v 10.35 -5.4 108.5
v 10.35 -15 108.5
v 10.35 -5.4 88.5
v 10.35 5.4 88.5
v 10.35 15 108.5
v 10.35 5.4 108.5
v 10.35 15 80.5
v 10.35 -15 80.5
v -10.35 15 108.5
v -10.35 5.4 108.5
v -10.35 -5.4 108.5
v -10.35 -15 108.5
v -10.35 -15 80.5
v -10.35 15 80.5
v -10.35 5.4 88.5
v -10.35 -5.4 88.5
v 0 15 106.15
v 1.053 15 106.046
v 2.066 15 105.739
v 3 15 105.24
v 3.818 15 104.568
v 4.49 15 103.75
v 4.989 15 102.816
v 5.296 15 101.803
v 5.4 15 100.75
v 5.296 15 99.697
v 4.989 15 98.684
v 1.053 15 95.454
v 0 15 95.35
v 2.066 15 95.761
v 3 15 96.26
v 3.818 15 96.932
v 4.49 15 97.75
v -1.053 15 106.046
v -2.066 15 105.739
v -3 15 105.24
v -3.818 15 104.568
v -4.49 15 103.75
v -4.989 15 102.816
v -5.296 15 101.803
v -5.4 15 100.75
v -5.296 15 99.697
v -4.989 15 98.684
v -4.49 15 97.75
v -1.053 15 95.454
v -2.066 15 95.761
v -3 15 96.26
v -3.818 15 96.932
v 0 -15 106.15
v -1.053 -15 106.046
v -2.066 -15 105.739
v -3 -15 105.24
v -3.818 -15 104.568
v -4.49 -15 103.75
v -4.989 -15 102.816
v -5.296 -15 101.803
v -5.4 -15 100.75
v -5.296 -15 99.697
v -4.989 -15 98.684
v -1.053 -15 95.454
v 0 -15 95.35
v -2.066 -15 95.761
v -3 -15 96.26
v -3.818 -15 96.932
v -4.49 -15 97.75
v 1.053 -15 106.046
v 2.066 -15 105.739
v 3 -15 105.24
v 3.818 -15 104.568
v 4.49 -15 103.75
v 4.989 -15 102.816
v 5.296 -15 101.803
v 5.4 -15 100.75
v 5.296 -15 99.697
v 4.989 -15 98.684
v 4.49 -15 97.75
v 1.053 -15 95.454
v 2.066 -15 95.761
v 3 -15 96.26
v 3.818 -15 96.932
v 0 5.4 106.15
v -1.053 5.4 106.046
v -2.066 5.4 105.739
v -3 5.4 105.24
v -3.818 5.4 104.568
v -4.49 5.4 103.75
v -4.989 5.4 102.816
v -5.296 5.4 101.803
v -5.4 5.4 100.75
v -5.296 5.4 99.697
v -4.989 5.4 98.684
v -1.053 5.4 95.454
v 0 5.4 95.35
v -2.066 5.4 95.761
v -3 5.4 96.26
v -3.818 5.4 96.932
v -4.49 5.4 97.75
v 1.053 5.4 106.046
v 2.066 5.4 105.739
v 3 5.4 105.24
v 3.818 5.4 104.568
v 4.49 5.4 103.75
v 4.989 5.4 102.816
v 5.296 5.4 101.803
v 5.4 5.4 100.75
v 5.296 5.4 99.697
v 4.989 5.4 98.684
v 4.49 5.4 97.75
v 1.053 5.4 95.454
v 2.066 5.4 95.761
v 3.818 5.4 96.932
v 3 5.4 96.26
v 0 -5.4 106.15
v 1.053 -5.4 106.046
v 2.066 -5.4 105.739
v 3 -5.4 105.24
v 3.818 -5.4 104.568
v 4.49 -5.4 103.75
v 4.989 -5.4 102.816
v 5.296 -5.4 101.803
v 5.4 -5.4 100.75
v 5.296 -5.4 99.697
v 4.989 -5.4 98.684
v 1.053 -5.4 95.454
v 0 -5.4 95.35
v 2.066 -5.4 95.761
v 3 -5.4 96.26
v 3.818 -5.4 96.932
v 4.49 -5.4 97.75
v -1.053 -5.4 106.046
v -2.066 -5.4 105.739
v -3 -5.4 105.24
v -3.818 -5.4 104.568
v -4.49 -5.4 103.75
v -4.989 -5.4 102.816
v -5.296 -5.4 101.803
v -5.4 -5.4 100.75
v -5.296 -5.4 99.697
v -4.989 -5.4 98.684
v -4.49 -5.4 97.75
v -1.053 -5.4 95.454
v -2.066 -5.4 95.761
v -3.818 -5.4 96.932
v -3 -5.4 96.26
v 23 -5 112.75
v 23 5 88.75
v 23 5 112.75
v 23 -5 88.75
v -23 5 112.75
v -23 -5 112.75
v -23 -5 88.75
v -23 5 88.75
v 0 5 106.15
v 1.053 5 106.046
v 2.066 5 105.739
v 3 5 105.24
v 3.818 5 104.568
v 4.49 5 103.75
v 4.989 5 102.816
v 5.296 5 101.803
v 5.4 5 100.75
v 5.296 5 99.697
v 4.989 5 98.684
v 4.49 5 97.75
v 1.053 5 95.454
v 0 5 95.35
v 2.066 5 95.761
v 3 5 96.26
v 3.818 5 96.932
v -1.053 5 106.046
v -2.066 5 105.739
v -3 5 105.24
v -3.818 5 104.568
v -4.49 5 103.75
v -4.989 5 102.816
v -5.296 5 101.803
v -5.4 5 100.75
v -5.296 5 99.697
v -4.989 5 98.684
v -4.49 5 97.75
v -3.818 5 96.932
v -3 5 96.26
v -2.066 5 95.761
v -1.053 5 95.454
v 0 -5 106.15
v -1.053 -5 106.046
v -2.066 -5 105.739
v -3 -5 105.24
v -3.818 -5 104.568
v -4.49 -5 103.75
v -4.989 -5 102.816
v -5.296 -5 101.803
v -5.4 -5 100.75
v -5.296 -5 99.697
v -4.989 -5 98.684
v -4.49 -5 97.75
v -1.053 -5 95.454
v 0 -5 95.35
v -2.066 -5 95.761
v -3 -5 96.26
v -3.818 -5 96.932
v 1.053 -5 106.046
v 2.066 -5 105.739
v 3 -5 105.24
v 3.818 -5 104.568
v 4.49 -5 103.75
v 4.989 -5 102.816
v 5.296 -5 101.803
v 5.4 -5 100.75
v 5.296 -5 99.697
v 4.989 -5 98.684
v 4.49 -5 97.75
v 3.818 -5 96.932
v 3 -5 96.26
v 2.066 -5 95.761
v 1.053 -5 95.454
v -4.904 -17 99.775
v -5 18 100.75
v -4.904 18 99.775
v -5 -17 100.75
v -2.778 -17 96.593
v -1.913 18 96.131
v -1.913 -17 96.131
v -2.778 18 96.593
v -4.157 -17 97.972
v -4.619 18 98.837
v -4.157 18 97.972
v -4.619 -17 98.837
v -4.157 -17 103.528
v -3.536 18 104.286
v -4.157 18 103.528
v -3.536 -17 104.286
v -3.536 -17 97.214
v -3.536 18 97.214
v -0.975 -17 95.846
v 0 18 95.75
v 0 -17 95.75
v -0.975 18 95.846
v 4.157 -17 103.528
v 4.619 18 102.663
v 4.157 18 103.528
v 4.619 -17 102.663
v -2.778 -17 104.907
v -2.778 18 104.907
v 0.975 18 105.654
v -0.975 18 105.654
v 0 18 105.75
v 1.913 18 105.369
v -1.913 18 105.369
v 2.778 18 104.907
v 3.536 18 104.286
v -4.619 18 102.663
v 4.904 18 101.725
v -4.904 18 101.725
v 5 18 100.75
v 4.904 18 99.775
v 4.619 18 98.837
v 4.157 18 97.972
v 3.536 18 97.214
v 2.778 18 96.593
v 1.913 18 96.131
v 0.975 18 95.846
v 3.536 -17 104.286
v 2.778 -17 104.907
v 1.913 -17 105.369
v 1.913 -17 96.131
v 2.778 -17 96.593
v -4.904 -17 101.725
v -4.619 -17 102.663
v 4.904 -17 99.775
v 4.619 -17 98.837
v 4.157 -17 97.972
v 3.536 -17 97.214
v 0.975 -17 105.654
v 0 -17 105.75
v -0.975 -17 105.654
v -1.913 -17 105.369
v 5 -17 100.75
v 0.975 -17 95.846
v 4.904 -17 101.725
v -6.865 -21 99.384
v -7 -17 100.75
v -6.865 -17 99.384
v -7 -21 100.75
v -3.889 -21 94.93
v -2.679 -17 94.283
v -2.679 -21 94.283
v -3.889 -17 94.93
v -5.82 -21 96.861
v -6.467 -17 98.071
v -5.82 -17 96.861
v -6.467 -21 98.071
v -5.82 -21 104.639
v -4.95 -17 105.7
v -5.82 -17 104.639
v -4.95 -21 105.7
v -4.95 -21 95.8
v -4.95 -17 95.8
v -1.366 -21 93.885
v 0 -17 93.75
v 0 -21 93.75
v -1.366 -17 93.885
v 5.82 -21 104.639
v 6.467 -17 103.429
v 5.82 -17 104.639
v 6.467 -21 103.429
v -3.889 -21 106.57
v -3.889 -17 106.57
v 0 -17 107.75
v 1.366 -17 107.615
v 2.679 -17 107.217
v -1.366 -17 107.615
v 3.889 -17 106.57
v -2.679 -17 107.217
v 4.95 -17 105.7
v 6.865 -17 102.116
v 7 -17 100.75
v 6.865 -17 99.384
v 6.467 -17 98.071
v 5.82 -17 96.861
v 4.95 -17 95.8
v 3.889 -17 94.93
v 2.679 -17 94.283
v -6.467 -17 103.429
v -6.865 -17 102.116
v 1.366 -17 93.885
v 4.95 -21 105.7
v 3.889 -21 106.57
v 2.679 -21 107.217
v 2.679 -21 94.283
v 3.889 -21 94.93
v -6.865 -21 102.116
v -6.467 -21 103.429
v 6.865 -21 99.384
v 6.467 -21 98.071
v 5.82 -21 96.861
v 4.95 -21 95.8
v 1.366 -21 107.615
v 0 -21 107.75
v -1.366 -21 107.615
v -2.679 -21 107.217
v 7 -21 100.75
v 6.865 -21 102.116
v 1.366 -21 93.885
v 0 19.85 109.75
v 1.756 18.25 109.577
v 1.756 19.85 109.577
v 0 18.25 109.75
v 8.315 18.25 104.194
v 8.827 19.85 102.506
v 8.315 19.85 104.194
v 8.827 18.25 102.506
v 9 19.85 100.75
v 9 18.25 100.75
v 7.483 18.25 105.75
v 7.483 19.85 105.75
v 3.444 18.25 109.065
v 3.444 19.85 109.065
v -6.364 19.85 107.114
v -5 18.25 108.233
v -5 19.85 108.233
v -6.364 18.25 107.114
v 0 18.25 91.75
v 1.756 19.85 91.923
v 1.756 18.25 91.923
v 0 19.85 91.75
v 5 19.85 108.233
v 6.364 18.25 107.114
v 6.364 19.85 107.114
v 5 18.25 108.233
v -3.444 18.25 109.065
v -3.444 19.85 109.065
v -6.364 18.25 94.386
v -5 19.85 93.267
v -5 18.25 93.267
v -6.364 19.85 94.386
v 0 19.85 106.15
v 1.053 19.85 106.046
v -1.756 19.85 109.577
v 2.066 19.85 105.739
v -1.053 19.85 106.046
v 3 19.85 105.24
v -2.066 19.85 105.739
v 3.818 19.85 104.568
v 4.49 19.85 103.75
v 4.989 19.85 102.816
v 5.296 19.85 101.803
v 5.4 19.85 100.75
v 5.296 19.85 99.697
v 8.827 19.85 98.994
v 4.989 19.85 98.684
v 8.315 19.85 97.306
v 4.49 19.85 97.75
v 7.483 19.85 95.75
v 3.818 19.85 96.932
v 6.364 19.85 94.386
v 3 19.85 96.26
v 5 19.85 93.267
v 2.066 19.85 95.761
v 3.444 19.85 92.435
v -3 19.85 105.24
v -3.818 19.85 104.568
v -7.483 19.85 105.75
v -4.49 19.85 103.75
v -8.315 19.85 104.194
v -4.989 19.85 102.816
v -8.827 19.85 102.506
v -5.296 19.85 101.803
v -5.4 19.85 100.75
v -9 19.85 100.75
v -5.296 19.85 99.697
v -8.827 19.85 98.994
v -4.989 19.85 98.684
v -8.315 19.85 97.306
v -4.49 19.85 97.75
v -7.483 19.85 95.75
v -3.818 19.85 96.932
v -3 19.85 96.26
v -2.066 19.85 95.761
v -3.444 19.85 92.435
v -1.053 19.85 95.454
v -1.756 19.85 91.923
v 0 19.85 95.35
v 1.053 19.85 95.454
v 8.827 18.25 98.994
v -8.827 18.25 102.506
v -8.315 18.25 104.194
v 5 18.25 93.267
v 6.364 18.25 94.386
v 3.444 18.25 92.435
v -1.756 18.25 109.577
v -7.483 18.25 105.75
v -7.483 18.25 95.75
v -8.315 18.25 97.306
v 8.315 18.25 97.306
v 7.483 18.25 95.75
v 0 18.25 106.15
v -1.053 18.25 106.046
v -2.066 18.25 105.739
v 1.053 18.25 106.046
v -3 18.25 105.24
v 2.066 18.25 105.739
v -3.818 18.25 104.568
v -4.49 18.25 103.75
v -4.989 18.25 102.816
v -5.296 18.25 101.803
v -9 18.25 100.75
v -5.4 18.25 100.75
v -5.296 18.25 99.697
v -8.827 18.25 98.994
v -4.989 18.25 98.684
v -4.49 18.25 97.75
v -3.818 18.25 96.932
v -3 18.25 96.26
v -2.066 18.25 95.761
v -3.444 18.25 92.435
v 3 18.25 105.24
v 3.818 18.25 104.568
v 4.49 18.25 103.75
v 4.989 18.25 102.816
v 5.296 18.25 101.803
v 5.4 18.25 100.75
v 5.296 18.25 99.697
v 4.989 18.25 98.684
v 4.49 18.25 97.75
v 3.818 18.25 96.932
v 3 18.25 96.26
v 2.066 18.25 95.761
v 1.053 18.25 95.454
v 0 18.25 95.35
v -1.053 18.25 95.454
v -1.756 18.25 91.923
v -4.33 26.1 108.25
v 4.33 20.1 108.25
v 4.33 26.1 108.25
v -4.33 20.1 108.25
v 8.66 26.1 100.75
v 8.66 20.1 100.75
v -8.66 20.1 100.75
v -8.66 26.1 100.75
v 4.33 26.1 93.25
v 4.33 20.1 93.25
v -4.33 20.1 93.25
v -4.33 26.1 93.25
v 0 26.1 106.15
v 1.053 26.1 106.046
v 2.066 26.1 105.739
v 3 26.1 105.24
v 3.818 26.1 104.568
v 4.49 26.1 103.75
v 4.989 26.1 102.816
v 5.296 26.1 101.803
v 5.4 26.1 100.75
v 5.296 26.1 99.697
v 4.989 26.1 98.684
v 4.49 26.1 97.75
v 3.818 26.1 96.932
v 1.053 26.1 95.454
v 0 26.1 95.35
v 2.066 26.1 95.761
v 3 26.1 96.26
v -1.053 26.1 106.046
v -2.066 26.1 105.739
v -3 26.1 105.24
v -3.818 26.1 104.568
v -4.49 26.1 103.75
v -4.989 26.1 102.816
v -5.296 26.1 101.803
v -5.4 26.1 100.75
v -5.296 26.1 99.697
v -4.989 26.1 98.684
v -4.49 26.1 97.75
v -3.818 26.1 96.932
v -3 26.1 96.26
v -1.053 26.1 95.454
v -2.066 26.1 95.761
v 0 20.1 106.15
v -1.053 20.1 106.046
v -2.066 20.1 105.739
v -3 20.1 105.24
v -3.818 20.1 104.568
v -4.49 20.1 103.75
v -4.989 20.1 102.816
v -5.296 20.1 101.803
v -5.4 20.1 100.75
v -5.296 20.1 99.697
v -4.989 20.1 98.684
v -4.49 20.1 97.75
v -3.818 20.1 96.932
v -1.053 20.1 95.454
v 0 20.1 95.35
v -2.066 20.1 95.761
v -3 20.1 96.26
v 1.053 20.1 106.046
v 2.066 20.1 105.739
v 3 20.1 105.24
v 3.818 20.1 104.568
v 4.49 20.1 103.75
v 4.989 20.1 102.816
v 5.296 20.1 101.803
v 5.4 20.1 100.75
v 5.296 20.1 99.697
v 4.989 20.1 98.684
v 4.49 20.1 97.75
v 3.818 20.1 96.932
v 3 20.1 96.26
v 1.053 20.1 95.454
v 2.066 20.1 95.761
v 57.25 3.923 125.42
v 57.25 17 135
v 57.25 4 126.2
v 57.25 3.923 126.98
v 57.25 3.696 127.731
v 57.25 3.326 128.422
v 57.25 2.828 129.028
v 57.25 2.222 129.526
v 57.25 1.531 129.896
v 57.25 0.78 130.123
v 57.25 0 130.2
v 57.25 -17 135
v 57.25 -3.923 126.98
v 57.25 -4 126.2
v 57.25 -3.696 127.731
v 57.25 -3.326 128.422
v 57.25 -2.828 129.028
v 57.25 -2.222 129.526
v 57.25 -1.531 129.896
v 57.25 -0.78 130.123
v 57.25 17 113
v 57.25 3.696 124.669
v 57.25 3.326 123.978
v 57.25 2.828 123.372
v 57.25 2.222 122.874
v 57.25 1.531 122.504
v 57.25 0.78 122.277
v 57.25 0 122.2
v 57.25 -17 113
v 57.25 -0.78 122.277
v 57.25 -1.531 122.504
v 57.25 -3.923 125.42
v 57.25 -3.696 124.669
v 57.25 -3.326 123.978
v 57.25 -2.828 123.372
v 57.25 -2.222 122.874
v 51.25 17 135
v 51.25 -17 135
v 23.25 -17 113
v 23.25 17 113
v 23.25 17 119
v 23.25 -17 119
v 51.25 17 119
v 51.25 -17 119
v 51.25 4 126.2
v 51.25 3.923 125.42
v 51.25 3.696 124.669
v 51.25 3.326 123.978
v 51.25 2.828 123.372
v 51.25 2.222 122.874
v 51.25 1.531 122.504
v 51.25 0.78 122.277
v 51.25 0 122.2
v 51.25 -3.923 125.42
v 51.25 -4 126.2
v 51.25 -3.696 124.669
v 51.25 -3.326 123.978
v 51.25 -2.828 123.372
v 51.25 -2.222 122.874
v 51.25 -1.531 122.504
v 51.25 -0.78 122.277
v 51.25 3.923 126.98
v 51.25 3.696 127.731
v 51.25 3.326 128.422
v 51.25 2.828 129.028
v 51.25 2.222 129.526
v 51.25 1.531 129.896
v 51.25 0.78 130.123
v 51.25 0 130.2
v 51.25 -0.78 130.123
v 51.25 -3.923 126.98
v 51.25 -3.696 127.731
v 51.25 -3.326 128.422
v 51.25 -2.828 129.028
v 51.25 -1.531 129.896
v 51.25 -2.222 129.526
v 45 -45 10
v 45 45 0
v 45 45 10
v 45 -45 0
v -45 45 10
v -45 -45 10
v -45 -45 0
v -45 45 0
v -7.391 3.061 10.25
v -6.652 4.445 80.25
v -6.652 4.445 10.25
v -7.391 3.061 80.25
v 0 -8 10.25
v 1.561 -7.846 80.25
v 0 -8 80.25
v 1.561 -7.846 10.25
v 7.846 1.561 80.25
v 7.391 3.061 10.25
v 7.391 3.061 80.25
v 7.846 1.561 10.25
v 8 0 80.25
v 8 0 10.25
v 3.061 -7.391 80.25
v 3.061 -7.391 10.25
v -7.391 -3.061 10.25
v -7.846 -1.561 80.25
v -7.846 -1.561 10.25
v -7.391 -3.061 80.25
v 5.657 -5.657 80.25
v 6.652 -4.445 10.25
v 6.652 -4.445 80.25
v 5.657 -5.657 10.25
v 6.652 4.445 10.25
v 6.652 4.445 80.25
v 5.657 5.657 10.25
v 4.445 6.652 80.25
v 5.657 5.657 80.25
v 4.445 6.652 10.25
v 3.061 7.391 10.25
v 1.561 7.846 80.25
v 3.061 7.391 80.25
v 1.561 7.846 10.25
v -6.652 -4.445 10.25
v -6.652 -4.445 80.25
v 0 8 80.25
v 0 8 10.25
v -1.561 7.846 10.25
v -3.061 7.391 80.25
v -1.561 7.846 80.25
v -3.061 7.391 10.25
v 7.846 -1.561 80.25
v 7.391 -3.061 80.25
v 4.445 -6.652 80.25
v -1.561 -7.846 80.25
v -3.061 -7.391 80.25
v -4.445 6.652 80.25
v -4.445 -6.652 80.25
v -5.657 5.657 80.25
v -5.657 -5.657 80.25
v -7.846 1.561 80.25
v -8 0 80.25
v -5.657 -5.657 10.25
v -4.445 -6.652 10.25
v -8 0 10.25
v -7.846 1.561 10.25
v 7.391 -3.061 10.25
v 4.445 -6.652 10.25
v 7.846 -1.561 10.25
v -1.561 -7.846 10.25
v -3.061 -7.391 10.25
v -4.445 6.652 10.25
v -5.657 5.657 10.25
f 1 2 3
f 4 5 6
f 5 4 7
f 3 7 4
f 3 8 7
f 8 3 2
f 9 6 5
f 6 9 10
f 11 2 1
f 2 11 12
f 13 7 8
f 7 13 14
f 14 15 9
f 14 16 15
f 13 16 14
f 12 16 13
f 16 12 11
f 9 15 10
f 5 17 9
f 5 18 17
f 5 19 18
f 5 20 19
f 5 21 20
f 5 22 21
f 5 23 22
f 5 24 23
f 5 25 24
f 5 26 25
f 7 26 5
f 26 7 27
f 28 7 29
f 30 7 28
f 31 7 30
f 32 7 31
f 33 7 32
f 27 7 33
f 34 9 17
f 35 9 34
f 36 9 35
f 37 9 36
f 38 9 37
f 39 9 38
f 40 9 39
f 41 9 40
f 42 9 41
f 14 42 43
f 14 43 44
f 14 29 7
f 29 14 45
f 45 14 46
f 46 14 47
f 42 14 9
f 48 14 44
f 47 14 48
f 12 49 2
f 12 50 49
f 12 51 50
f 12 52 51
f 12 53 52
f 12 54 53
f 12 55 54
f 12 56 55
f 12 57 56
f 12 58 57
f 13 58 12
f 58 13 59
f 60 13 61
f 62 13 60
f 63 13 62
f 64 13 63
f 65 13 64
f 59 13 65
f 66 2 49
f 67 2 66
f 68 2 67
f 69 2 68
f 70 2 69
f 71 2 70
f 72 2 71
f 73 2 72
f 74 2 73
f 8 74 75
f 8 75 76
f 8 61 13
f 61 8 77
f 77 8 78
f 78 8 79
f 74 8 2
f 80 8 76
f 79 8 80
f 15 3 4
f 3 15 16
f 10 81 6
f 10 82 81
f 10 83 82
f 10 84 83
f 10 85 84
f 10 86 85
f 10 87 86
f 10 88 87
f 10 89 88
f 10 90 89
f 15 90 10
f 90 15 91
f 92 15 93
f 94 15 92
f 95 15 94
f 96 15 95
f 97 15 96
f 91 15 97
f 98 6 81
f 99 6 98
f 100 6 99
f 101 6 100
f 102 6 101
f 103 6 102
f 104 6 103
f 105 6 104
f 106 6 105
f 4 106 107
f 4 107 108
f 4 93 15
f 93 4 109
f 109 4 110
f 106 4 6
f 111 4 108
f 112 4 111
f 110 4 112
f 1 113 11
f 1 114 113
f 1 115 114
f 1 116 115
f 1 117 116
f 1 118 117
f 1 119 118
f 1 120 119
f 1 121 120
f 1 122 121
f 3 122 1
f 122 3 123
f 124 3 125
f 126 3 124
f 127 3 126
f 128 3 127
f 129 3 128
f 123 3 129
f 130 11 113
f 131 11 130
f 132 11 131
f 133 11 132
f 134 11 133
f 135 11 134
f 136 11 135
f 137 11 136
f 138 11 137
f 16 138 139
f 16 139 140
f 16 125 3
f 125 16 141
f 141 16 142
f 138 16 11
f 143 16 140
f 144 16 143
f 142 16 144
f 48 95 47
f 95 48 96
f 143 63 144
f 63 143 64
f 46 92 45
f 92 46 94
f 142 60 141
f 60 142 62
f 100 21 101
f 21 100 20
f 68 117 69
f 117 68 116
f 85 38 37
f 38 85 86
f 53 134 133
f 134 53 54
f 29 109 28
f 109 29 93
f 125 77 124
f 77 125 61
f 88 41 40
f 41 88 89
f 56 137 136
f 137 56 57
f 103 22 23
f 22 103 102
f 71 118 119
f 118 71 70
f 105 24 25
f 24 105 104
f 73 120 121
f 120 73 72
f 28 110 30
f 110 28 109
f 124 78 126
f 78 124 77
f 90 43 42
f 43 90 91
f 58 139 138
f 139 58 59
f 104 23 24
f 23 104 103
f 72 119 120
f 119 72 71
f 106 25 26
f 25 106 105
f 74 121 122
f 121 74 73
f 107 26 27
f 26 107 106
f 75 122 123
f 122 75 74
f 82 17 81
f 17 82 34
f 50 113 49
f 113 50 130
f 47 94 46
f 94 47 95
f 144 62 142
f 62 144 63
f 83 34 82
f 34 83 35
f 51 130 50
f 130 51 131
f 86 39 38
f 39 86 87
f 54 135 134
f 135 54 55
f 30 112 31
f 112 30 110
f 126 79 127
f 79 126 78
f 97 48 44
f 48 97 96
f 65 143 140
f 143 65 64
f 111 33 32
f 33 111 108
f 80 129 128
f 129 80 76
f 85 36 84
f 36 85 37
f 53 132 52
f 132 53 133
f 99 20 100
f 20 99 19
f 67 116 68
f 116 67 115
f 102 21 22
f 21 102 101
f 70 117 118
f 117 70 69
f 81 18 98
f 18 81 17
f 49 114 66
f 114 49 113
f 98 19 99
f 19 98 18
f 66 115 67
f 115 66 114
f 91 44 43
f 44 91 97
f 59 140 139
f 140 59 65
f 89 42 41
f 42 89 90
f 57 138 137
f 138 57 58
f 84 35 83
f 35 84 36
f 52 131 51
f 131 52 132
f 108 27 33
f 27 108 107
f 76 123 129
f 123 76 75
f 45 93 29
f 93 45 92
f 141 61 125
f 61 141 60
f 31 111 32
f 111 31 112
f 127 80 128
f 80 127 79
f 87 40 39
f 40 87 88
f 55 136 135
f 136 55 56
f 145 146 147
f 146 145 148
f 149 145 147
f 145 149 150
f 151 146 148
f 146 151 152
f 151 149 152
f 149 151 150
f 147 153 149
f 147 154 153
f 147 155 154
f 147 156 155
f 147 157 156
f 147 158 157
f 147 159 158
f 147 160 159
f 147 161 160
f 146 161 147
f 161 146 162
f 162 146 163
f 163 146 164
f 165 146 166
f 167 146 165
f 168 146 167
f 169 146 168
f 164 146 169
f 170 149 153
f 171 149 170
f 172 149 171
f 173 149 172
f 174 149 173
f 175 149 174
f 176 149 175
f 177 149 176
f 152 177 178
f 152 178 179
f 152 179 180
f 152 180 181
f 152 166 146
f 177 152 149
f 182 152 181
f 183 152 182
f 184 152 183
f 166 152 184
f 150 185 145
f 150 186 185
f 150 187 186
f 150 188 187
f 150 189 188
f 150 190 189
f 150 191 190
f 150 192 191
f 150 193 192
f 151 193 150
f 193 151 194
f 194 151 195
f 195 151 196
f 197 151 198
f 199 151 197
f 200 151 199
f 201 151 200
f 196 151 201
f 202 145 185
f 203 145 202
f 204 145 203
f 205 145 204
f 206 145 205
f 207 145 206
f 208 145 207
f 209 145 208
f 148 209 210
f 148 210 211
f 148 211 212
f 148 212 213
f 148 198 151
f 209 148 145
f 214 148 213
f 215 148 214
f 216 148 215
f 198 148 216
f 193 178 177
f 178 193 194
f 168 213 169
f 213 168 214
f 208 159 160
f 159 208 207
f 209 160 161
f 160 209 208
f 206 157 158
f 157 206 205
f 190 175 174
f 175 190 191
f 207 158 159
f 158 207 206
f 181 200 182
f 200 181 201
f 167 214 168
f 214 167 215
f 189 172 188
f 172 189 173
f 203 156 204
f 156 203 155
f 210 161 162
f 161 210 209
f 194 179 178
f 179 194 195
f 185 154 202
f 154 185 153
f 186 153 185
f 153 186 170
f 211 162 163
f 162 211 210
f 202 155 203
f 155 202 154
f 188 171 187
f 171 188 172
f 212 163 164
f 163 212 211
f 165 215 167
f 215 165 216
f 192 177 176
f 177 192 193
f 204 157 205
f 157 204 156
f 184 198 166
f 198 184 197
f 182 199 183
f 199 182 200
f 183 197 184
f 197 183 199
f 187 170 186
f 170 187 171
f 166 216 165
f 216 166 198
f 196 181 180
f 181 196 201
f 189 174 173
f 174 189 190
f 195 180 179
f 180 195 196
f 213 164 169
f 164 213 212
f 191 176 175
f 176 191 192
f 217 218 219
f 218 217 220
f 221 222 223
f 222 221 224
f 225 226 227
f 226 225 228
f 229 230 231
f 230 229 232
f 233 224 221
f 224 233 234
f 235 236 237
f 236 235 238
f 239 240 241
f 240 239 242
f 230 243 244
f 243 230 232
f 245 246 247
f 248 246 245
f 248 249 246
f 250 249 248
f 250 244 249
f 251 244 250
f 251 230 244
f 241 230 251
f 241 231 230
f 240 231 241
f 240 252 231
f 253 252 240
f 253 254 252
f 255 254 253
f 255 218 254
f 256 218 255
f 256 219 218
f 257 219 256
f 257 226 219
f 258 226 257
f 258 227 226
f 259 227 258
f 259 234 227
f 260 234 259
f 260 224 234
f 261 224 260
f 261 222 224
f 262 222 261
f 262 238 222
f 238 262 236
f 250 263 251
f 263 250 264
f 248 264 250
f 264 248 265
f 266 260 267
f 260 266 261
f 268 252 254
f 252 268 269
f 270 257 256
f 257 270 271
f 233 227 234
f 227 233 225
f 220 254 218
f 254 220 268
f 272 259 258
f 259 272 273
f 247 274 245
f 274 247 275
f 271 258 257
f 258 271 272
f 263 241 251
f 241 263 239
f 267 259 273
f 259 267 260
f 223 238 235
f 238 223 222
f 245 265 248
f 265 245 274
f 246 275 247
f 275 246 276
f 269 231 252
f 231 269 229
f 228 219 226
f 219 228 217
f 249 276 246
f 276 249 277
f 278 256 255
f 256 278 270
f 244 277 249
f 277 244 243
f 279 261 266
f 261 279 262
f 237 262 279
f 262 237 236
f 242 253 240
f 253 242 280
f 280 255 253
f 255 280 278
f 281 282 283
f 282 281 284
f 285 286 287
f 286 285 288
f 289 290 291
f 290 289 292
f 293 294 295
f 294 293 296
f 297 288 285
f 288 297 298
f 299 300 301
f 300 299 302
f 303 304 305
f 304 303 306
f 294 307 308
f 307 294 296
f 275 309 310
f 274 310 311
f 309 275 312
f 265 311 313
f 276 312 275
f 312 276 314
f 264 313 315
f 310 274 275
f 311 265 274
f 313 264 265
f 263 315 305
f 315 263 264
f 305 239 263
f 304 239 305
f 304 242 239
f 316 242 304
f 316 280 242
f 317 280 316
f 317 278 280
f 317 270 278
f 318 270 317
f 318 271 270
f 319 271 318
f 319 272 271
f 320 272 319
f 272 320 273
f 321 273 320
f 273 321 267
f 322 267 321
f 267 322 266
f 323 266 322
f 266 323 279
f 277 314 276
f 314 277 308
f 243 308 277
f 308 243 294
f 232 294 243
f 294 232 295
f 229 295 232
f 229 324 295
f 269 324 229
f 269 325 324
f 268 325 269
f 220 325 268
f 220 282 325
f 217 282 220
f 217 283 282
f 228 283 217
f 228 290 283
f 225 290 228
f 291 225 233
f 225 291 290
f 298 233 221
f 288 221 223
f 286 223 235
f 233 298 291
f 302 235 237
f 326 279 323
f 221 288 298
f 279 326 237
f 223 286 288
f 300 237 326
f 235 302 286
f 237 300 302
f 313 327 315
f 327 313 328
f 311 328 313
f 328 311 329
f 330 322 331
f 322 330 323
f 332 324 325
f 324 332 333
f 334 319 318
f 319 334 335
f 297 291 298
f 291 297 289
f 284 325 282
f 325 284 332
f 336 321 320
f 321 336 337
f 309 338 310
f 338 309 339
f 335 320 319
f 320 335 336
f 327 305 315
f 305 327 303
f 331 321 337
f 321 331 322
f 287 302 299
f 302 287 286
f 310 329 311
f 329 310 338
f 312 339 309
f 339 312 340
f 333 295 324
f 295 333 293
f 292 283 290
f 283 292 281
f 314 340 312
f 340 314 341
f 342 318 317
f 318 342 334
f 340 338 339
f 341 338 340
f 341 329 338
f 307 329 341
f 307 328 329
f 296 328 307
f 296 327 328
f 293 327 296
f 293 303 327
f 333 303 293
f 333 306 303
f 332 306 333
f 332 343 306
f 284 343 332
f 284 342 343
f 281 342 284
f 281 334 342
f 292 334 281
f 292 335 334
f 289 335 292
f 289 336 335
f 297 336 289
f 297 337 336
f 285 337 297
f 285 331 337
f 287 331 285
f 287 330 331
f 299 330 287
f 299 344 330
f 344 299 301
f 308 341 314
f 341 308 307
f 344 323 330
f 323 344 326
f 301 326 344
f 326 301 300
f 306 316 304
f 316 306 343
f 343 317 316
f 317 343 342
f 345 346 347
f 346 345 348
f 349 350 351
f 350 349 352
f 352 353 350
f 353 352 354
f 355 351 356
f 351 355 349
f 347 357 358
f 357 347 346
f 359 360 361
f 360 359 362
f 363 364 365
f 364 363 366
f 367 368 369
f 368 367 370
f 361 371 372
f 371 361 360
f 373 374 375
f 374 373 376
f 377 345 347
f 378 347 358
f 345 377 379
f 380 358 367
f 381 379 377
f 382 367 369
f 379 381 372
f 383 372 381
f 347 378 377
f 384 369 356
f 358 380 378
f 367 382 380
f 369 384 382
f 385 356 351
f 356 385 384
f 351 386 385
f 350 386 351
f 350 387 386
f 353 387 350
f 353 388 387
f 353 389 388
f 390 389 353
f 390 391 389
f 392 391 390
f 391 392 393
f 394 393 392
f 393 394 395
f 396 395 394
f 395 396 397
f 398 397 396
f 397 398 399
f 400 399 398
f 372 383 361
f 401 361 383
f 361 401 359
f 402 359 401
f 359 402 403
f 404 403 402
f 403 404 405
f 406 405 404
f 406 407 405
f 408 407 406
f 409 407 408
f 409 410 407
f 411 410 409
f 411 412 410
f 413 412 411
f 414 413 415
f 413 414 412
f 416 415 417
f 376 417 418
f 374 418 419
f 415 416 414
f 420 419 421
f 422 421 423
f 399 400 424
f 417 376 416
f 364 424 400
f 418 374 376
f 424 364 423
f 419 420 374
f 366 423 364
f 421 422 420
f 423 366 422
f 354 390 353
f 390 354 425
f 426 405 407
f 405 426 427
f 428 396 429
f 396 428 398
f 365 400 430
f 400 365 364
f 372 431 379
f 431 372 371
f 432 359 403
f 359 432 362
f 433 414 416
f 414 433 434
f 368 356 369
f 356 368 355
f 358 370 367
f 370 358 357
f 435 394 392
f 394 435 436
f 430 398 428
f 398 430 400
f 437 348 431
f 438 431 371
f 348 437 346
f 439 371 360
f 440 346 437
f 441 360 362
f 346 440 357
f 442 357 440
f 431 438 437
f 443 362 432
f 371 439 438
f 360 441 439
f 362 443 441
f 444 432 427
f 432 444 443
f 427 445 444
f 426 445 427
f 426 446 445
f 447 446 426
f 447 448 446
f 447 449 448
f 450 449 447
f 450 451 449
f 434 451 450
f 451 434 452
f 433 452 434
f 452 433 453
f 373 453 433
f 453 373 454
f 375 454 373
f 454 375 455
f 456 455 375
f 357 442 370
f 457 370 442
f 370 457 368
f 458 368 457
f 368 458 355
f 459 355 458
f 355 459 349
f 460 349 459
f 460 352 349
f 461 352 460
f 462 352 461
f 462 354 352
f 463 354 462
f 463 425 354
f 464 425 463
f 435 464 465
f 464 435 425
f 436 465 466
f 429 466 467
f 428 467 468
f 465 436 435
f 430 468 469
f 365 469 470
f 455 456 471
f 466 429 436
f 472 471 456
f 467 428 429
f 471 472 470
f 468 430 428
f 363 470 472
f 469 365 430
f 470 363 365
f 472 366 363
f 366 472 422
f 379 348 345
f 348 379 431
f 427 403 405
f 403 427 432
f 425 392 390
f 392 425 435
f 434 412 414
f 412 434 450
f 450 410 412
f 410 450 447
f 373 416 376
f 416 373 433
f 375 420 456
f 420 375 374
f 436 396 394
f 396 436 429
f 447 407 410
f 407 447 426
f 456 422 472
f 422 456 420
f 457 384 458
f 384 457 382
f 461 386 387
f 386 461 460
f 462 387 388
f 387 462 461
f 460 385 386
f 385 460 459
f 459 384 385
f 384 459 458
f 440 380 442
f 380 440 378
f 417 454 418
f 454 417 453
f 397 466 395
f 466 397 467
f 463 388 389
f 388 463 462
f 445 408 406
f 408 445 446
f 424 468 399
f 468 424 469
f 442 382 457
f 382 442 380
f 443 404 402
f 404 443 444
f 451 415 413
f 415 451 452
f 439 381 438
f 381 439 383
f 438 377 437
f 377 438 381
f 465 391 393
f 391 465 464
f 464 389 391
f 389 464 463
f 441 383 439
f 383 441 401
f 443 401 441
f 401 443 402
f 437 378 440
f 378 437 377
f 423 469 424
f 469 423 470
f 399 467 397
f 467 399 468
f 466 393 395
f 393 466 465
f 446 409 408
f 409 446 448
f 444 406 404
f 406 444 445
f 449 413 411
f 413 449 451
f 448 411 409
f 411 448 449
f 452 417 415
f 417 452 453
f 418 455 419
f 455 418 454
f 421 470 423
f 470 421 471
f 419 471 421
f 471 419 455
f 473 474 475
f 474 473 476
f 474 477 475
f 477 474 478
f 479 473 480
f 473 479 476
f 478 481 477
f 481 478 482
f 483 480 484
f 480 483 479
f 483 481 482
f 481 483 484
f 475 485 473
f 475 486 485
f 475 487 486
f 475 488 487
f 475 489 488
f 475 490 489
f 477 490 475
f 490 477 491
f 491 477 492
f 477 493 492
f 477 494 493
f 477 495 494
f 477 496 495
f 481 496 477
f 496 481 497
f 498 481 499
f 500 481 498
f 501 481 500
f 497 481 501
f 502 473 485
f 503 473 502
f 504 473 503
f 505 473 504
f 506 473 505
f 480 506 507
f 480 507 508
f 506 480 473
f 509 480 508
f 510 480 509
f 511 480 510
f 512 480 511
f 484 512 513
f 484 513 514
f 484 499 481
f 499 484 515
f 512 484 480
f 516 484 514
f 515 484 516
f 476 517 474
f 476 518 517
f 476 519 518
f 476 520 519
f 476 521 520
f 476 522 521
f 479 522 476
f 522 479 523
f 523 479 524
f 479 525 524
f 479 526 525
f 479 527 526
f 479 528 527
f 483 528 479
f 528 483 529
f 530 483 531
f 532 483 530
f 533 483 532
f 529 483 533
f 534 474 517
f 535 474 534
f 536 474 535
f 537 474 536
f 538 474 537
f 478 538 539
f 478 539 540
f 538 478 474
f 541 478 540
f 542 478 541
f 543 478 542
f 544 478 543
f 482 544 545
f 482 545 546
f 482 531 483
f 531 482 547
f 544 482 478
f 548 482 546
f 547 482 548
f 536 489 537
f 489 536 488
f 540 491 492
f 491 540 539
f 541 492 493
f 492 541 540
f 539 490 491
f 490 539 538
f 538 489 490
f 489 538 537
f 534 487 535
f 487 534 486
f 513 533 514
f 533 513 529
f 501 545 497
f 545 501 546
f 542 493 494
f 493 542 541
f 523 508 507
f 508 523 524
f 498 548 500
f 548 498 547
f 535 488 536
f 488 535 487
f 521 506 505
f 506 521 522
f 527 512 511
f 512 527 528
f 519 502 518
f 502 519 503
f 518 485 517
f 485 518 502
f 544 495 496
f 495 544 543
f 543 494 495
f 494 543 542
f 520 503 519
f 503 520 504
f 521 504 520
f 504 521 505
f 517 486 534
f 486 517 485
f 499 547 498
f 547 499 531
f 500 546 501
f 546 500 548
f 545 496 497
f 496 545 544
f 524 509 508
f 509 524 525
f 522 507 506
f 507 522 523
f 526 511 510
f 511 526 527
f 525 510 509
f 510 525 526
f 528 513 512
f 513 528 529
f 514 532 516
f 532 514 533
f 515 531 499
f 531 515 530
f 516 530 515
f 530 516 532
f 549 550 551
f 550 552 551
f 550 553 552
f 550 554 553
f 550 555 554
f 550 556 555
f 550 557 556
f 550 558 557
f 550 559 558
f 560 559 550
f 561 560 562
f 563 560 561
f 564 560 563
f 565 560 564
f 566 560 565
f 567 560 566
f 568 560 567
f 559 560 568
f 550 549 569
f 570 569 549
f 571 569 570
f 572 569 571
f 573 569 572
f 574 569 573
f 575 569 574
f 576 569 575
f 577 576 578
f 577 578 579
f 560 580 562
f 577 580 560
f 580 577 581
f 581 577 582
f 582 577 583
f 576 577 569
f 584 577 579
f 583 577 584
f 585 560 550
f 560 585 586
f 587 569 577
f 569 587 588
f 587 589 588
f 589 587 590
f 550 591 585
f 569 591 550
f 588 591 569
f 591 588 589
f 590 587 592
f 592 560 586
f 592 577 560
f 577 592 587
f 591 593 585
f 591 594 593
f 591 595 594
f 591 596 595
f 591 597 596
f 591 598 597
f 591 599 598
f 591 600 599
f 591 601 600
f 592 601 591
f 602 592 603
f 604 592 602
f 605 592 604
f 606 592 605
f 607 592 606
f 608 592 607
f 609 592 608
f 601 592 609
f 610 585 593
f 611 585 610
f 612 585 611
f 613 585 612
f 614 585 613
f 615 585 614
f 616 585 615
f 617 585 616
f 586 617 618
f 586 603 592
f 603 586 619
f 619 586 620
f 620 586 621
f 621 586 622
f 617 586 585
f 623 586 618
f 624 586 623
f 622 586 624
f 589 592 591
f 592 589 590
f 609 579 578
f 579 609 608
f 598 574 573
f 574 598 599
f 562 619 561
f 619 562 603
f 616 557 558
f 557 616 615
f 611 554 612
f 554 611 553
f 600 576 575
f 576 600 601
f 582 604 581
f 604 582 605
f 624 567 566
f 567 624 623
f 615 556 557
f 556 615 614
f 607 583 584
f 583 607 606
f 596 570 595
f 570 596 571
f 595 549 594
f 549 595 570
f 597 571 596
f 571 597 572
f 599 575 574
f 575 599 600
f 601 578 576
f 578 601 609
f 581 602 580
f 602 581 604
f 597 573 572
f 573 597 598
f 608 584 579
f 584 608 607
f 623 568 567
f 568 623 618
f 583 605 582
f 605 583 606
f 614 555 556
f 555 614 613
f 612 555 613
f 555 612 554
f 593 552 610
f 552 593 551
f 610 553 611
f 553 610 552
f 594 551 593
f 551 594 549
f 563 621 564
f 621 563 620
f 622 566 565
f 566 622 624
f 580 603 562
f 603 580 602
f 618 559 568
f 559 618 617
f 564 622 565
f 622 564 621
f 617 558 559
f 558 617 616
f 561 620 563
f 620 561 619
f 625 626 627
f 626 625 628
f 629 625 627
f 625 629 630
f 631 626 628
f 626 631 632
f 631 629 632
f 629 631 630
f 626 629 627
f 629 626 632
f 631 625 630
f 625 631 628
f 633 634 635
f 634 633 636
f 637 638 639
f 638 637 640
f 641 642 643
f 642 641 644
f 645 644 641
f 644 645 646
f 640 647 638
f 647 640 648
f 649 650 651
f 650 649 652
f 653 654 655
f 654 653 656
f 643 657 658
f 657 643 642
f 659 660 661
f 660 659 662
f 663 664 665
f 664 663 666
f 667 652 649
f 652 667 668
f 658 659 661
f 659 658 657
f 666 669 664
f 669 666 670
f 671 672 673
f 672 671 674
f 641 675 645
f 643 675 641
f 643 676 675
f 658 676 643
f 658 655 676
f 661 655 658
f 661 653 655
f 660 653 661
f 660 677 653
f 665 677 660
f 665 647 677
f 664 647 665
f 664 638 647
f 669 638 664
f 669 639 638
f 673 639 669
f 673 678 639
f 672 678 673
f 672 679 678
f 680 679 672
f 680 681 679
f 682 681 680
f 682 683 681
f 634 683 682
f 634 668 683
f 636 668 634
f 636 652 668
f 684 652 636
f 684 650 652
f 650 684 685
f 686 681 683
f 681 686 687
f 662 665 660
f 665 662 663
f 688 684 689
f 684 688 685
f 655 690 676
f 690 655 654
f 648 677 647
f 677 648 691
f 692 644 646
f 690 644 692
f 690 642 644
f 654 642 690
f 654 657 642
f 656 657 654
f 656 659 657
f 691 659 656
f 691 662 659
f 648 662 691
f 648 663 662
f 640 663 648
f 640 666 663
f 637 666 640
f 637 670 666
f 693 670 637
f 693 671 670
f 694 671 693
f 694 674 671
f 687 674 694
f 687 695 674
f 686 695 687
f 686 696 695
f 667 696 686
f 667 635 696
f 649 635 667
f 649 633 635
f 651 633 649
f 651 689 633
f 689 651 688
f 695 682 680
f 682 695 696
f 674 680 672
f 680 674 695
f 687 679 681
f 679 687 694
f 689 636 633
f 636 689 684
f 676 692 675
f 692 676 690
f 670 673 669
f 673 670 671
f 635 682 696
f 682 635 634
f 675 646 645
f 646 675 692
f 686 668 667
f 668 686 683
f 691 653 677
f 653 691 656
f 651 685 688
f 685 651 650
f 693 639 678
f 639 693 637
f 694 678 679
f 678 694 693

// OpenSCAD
$fn = 32;

// ------------------------------------------------------------------------
// Lamp arm: column d16 x 70 mm, arm 46 mm
// Every part is its own module, assembly() places every instance.
// ------------------------------------------------------------------------

// --- part 1 ---
module lamp_base() {
  difference() {
    translate([-45, -45, 0]) cube([90, 90, 10]);
  }
}

// --- part 2 ---
module lamp_column() {
  cylinder(h = 70, d = 16);
}

// --- part 3 ---
module head_fork() {
  difference() {
    translate([-10.35, -15, 0]) cube([20.7, 30, 28]);
    translate([-11.35, -5.4, 8]) cube([22.7, 10.8, 21]);
    translate([0, 0, 20.25]) rotate([90, 0, 0]) cylinder(h = 32, d = 10.8, center = true);
  }
}

// --- part 4 ---
module lamp_arm() {
  difference() {
    translate([-23, -5, 0]) cube([46, 10, 24]);
    translate([0, 0, 12]) rotate([90, 0, 0]) cylinder(h = 12, d = 10.8, center = true);
  }
}

// --- part 5 ---
module arm_pin() {
  rotate([0, 90, 0]) cylinder(h = 36, d = 10, center = true);
  translate([-21, 0, 0]) rotate([0, 90, 0]) cylinder(h = 4, d = 14);
}

// --- part 6 ---
module arm_washer() {
  difference() {
      translate([0, 0, 0]) cylinder(h = 1.6, d = 18);
      translate([0, 0, -1]) cylinder(h = 3.6, d = 10.8);
    }
}

// --- part 7 ---
module arm_nut() {
  difference() {
    linear_extrude(height = 6) polygon(points = [[8.66, 0], [4.33, 7.5], [-4.33, 7.5], [-8.66, 0], [-4.33, -7.5], [4.33, -7.5]]);
    translate([0, 0, -1]) cylinder(h = 8, d = 10.8);
  }
}

// --- part 8 ---
module shade_bracket() {
  difference() {
    translate([-17, -17, 0]) cube([34, 34, 22]);
    translate([-18, -18, 6]) cube([29, 36, 17]);
    translate([14, 0, 13.2]) rotate([0, 90, 0]) cylinder(h = 8, d = 8, center = true);
  }
}

// --- assembly ---
module assembly() {
  color([0.80, 0.24, 0.20]) translate([0, 0, 0]) rotate([0, 0, 0]) lamp_base();
  color([0.20, 0.45, 0.75]) translate([0, 0, 10.25]) rotate([0, 0, 0]) lamp_column();
  color([0.25, 0.62, 0.32]) translate([0, 0, 80.5]) rotate([0, 0, 0]) head_fork();
  color([0.92, 0.70, 0.18]) translate([0, 0, 88.75]) rotate([0, 0, 0]) lamp_arm();
  color([0.58, 0.35, 0.70]) translate([0, 0, 100.75]) rotate([0, 0, 90]) arm_pin();
  color([0.16, 0.66, 0.66]) translate([0, 19.85, 100.75]) rotate([90, 0, 0]) arm_washer();
  color([0.85, 0.48, 0.18]) translate([0, 26.1, 100.75]) rotate([90, 0, 0]) arm_nut();
  color([0.55, 0.60, 0.65]) translate([40.25, 0, 113]) rotate([0, 0, 0]) shade_bracket();
}

assembly();
